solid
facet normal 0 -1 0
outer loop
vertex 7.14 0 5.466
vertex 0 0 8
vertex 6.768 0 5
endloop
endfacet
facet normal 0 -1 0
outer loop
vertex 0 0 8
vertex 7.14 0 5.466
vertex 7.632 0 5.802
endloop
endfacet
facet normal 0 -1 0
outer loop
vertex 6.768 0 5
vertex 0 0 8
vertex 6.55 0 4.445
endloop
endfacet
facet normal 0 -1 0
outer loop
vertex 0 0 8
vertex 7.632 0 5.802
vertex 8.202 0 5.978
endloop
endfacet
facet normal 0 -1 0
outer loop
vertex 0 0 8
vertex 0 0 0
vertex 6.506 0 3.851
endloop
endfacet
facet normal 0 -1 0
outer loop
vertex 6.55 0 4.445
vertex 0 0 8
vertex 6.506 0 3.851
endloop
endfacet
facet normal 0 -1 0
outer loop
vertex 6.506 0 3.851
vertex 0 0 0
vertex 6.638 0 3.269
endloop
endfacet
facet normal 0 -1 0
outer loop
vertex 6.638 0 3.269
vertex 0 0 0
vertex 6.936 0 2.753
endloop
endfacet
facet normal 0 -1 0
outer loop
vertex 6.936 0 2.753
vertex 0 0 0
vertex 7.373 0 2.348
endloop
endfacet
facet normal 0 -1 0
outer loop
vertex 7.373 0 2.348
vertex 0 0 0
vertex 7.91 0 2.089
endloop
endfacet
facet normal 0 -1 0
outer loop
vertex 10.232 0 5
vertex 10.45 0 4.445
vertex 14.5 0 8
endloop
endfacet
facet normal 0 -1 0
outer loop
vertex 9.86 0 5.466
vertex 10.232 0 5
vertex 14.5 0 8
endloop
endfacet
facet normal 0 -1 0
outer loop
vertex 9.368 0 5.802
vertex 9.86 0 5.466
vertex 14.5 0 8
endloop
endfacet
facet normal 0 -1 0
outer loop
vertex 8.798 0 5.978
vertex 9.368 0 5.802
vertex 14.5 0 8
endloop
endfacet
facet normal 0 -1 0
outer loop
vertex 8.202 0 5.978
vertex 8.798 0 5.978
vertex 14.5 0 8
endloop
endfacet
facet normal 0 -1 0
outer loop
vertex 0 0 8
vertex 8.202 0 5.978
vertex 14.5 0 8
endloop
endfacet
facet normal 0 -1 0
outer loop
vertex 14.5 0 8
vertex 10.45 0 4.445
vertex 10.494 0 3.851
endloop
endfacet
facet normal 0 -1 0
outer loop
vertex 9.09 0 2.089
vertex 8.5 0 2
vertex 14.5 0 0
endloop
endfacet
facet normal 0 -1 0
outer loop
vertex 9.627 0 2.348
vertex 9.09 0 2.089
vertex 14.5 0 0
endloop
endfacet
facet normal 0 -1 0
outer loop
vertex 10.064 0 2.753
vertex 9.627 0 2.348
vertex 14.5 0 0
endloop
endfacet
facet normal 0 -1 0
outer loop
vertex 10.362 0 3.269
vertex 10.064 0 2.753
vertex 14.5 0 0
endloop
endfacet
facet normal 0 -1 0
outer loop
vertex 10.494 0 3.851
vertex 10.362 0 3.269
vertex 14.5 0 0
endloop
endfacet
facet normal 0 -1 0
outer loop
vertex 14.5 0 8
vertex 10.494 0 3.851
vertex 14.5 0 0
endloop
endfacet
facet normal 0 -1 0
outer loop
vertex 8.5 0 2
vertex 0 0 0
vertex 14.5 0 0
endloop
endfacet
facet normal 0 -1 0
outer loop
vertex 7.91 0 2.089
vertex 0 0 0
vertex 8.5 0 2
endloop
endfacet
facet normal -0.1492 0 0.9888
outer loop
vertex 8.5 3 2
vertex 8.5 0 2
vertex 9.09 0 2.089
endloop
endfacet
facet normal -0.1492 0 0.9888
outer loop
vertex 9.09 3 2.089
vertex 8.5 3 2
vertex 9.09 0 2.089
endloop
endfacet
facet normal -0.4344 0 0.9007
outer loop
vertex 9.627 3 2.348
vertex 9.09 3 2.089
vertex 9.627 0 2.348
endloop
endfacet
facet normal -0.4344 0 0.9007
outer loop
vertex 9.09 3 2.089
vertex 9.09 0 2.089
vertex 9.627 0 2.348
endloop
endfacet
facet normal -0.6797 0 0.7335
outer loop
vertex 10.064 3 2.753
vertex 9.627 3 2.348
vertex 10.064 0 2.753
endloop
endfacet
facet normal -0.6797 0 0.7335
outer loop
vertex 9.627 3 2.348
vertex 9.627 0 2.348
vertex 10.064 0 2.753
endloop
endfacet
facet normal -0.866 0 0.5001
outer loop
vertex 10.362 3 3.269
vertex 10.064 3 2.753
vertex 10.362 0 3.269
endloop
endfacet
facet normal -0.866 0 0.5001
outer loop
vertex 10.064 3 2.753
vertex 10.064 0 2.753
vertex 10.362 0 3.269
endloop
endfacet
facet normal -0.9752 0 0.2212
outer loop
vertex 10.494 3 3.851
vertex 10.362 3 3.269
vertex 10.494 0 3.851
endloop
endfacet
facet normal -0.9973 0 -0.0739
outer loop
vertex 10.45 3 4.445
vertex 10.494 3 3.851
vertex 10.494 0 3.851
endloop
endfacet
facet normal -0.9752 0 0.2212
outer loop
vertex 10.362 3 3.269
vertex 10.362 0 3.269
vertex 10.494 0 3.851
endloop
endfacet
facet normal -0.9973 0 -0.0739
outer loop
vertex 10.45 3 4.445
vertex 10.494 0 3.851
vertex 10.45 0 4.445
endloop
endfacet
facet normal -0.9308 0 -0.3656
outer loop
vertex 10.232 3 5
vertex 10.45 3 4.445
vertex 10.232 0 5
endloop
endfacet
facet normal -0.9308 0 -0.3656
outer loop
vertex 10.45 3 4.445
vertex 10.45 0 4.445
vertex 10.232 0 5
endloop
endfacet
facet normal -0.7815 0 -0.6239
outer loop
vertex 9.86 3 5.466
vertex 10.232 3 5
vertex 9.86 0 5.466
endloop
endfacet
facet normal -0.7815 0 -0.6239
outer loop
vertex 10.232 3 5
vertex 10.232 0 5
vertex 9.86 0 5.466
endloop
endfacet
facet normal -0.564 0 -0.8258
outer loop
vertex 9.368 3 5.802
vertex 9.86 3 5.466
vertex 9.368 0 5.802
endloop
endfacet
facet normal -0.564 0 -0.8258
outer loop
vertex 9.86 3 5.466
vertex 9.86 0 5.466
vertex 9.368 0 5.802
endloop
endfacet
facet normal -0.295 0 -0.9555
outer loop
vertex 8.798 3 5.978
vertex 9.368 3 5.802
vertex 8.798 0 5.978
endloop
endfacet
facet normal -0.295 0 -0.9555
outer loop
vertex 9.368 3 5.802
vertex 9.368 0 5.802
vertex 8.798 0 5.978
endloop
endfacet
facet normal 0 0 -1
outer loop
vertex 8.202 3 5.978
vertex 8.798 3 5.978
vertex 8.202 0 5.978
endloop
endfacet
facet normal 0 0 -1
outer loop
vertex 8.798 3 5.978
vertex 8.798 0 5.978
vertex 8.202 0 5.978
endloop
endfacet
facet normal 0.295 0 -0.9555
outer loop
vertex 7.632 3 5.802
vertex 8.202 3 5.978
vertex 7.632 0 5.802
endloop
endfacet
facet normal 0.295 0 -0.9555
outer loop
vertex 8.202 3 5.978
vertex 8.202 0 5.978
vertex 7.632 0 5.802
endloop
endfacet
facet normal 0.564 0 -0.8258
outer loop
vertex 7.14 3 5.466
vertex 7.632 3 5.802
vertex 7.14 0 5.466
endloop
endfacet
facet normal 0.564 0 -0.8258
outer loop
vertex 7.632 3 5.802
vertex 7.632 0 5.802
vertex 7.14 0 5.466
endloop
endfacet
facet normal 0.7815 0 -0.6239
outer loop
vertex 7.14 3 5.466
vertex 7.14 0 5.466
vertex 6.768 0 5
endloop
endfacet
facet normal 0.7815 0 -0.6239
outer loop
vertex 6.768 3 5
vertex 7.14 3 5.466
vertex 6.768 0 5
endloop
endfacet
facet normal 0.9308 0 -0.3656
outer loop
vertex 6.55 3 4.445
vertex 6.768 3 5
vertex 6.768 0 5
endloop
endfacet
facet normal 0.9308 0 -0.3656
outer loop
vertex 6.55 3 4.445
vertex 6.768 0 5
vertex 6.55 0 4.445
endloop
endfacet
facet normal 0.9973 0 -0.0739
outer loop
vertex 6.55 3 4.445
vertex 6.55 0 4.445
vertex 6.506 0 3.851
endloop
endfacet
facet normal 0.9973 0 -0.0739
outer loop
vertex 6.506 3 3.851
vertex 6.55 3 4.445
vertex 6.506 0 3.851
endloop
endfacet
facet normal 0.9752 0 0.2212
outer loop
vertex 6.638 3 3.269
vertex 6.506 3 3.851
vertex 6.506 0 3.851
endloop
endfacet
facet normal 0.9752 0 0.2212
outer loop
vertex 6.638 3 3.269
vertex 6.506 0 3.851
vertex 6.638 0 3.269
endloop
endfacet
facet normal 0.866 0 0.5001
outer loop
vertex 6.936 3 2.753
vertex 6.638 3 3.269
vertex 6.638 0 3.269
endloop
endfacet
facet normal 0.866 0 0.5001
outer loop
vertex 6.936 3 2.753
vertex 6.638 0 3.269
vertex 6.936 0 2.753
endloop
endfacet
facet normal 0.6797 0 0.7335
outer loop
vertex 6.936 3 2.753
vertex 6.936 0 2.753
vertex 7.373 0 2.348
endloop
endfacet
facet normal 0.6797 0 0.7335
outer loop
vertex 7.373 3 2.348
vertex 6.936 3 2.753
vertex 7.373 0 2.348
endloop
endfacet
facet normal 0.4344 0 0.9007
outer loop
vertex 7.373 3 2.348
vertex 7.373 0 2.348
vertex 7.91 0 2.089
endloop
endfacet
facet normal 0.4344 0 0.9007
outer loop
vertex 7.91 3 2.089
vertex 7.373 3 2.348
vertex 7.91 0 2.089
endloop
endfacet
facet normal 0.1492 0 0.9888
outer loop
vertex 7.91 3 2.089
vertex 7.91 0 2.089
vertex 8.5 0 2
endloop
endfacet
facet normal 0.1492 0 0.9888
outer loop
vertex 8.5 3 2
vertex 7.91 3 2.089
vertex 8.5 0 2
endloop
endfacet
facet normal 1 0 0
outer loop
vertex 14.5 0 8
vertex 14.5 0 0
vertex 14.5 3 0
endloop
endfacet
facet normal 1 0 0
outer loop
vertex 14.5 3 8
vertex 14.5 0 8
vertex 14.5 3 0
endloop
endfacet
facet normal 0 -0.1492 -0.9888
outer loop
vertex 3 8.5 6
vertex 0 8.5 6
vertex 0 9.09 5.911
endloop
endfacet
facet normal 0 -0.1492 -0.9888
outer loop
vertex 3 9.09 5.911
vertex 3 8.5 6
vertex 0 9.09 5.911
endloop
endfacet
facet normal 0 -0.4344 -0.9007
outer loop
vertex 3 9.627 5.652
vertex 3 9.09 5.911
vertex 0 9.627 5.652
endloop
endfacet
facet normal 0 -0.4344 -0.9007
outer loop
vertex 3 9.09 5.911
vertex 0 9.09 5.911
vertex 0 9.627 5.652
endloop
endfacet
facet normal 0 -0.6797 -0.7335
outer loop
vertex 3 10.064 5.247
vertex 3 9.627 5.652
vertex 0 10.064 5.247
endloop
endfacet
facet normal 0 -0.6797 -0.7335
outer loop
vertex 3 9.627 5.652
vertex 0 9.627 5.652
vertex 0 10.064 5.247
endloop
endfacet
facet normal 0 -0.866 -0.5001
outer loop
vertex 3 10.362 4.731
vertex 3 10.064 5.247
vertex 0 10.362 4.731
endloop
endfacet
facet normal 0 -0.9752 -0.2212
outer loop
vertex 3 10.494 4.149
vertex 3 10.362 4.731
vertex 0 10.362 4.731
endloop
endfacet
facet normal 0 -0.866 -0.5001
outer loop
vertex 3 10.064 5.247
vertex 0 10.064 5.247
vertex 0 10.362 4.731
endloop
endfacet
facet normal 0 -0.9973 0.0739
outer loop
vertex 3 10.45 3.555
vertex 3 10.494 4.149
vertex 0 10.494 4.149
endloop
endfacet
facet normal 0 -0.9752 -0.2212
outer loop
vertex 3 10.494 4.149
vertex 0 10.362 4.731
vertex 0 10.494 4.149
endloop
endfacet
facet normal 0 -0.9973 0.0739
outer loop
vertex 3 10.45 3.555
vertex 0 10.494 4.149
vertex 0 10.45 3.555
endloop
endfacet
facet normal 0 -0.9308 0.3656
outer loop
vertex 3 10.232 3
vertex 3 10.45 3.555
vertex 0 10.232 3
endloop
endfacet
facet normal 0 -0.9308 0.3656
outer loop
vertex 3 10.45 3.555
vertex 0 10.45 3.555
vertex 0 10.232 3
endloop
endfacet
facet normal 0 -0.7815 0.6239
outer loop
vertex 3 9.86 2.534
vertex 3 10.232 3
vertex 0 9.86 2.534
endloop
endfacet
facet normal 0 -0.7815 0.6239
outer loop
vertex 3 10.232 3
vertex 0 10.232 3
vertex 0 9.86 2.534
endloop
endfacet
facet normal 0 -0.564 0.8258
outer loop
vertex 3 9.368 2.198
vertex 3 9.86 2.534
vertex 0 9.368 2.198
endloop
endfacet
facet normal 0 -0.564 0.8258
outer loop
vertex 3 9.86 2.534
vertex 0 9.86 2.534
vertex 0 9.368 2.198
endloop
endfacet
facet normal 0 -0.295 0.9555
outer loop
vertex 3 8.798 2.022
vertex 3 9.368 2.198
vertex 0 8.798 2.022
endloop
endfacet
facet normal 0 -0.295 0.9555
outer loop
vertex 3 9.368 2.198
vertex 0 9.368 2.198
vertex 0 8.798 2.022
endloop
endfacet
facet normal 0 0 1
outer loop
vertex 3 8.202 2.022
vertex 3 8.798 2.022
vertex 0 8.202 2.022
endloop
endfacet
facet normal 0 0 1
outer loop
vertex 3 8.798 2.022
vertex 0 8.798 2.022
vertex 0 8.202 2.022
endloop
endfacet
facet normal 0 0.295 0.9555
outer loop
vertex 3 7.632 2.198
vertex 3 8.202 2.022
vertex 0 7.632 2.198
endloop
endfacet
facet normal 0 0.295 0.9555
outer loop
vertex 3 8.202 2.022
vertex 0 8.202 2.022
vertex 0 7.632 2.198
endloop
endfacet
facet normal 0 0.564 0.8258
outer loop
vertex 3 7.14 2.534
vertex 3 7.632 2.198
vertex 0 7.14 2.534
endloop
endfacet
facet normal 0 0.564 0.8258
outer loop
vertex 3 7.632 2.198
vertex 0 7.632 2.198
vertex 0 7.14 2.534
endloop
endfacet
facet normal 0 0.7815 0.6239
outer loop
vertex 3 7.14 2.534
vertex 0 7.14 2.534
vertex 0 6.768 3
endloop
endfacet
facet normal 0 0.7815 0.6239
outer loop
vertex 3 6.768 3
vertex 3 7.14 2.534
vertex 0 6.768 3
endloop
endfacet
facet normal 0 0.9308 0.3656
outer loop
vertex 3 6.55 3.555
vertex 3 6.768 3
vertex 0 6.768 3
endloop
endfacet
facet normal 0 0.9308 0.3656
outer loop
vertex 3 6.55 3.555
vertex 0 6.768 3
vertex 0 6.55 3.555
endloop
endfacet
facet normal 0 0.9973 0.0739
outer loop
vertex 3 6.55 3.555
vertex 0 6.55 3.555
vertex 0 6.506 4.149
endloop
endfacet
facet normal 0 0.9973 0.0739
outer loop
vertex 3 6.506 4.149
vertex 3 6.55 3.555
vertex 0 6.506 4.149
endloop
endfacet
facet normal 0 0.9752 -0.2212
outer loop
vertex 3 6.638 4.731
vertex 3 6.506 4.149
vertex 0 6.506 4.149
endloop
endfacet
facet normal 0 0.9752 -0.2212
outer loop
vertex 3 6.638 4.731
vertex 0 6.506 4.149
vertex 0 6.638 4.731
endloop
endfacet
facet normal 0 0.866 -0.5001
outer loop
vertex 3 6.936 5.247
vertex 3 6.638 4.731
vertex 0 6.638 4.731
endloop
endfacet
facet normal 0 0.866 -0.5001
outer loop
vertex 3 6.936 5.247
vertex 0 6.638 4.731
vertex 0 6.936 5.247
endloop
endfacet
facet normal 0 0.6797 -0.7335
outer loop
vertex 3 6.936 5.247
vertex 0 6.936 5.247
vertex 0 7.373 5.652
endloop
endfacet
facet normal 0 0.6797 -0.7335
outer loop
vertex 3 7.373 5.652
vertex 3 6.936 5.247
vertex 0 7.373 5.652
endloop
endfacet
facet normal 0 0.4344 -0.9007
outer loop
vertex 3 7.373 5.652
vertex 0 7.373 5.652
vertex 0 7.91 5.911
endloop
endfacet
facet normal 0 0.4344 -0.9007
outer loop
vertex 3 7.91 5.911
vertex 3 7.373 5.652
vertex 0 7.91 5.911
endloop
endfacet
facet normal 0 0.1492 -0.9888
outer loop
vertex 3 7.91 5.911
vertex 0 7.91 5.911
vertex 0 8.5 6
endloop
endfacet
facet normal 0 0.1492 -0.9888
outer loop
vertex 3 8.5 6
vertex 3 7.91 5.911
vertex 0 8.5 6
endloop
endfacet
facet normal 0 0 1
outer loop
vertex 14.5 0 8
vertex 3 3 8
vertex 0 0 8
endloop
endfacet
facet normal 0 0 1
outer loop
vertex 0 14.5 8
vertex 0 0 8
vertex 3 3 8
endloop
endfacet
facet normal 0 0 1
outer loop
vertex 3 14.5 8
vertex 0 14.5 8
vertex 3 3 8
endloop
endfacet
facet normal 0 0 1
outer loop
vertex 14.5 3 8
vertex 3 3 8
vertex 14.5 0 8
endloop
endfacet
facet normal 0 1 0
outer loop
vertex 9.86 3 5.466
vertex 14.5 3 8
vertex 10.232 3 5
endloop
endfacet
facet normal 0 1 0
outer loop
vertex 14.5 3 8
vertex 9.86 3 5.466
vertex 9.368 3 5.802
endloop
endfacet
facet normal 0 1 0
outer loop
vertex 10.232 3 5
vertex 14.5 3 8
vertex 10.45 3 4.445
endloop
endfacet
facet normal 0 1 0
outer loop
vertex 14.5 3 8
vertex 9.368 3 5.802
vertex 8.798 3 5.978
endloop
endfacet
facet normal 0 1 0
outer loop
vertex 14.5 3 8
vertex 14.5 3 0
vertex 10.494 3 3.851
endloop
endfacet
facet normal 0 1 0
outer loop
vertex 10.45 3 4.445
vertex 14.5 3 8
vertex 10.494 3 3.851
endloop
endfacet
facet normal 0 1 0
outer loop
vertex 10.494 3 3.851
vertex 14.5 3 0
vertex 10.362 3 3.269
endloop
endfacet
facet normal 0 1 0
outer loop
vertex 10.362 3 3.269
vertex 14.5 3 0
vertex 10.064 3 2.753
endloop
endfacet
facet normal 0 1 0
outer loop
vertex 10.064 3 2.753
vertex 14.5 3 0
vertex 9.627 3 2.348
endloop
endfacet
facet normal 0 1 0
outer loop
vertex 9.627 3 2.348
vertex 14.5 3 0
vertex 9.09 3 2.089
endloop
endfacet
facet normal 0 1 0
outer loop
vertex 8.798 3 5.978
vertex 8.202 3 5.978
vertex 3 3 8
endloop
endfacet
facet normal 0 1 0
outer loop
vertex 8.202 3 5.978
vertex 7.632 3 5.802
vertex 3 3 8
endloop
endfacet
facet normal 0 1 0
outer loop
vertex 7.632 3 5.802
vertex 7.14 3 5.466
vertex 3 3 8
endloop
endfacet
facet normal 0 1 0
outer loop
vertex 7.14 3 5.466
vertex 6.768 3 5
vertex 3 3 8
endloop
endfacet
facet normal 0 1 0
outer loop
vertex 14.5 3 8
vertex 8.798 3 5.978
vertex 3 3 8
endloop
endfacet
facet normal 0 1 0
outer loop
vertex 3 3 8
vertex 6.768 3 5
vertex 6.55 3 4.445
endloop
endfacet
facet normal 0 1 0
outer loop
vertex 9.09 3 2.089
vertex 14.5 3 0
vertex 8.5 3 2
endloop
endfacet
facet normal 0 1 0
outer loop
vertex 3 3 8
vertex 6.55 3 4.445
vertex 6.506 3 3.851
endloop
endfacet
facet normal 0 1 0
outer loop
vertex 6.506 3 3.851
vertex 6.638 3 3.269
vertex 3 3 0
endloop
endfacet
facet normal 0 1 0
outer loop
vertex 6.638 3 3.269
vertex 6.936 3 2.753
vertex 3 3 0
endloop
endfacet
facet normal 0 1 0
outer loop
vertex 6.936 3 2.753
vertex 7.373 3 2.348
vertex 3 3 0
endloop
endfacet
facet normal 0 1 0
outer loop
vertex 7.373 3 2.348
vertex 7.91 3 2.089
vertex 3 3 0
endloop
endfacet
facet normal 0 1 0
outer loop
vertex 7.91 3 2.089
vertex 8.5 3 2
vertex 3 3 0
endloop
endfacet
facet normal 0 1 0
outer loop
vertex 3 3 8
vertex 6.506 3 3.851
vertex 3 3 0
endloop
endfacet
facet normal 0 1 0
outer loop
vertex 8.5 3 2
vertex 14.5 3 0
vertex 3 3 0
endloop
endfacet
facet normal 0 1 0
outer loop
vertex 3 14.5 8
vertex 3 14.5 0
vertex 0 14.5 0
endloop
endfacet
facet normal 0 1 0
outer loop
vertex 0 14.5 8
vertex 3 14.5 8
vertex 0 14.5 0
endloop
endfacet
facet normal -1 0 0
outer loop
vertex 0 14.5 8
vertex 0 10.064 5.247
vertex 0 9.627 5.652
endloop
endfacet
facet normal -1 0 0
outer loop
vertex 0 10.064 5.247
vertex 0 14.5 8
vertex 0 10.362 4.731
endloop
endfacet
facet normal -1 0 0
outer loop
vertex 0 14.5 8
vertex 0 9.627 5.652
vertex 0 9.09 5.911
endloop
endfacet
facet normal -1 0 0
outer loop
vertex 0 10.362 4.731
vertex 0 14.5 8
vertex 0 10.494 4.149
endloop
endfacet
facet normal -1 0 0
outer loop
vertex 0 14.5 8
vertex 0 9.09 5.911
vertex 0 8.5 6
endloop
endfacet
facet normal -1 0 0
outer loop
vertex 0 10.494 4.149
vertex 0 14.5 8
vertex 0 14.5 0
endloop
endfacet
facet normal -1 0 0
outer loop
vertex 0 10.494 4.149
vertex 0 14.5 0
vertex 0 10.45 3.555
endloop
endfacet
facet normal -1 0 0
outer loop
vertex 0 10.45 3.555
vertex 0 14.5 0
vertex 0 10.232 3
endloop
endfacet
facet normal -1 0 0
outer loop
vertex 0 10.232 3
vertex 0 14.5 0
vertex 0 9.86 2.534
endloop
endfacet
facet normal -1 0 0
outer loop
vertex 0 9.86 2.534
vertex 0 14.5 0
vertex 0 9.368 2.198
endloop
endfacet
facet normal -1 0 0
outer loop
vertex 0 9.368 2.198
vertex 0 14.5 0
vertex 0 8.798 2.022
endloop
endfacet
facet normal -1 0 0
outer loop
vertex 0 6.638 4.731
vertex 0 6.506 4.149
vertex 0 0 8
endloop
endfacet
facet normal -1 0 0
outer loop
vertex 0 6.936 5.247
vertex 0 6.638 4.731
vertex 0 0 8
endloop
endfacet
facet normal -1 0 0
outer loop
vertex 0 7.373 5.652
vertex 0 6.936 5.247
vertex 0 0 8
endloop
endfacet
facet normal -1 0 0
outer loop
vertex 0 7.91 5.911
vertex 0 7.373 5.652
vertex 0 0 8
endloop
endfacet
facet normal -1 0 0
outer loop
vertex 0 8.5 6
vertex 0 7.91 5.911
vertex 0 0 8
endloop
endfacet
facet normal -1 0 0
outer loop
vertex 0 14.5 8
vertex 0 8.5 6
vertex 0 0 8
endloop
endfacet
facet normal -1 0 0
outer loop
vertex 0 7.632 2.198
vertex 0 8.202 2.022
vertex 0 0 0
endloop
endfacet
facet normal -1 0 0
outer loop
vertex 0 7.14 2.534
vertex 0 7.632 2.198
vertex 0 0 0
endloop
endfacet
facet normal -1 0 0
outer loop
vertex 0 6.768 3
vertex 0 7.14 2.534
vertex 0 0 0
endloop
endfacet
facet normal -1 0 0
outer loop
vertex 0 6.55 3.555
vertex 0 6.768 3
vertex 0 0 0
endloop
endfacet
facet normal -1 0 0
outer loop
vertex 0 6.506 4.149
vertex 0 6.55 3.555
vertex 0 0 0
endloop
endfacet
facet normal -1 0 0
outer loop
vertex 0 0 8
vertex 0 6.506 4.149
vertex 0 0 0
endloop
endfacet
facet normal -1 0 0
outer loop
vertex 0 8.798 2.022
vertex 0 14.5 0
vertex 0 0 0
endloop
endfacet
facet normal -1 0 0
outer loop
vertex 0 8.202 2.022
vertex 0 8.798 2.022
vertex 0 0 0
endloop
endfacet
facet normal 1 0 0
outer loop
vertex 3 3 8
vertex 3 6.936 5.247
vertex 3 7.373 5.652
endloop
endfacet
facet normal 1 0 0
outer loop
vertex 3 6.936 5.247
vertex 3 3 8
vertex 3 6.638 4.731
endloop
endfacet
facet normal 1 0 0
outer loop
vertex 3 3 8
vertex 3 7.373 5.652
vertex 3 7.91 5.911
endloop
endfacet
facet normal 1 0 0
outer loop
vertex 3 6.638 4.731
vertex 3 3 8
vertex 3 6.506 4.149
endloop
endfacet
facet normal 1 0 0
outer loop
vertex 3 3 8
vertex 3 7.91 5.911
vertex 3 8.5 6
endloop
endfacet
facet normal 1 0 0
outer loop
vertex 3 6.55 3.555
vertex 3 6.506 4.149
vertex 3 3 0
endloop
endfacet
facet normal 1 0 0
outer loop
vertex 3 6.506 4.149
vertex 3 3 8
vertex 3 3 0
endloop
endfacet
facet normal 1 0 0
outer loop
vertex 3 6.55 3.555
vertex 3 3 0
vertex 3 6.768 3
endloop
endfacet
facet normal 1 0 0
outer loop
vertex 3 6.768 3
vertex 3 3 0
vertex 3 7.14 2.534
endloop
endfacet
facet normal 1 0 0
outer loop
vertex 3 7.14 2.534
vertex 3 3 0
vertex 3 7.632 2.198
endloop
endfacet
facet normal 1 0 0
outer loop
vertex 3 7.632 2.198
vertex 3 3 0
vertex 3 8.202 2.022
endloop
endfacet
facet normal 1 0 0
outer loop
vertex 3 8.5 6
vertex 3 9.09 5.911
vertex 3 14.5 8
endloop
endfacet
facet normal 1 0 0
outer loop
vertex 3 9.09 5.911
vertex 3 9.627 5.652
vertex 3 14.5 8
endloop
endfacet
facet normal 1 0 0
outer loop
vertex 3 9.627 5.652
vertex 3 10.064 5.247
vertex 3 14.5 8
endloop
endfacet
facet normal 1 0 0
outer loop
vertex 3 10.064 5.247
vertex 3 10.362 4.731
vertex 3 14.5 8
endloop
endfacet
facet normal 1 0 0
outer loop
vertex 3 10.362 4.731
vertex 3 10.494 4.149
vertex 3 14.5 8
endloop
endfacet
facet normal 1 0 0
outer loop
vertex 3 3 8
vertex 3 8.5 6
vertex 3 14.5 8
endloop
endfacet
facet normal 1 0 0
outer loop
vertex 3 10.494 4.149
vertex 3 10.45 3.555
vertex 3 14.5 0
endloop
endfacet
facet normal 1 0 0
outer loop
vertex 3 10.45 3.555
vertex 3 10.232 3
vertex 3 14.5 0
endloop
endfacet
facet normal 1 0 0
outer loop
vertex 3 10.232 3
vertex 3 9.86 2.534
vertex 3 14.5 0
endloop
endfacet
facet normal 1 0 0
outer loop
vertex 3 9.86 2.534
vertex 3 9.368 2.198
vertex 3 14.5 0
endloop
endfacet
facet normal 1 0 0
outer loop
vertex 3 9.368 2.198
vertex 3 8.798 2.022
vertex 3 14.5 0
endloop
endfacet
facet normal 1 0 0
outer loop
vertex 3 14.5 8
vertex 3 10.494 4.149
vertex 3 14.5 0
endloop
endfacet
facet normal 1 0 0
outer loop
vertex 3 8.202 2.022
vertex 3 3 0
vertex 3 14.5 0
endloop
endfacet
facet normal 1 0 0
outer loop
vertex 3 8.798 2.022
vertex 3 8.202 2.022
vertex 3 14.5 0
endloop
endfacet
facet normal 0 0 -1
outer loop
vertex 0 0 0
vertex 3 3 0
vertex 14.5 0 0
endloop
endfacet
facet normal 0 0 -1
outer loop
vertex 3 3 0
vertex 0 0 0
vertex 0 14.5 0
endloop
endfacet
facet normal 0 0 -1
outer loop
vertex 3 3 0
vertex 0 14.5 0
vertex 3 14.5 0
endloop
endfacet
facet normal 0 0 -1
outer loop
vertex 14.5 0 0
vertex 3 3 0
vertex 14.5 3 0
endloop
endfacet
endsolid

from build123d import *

# Parameters (mm, degrees)
EXTRUDE_1_DEPTH     = 8
SKETCH_2_R          = 2
CUT_EXTRUDE_1_DEPTH = 23.011360703
SKETCH_3_R          = 2
CUT_EXTRUDE_3_DEPTH = 8


with BuildPart() as part:
    # 草图1 → 凸台-拉伸1 (new body)
    with BuildSketch(Plane.XY):
        Polygon((0, 0), (14.5, 0), (14.5, 3), (3, 3), (3, 14.5), (0, 14.5), align=None)
    extrude(amount=EXTRUDE_1_DEPTH)

    # 草图2 → 切除-拉伸1 (cut, through all)
    with BuildSketch(Plane.XZ):
        with Locations(Location((8.5, 4, 0), (0, 0, 270))):
            Circle(SKETCH_2_R)
    extrude(amount=-CUT_EXTRUDE_1_DEPTH, mode=Mode.SUBTRACT)

    # 草图3 → 切除-拉伸3 (cut)
    with BuildSketch(Plane.ZY):
        with Locations((4, 8.5)):
            Circle(SKETCH_3_R)
    extrude(amount=-CUT_EXTRUDE_3_DEPTH, mode=Mode.SUBTRACT)


solid = part.part
